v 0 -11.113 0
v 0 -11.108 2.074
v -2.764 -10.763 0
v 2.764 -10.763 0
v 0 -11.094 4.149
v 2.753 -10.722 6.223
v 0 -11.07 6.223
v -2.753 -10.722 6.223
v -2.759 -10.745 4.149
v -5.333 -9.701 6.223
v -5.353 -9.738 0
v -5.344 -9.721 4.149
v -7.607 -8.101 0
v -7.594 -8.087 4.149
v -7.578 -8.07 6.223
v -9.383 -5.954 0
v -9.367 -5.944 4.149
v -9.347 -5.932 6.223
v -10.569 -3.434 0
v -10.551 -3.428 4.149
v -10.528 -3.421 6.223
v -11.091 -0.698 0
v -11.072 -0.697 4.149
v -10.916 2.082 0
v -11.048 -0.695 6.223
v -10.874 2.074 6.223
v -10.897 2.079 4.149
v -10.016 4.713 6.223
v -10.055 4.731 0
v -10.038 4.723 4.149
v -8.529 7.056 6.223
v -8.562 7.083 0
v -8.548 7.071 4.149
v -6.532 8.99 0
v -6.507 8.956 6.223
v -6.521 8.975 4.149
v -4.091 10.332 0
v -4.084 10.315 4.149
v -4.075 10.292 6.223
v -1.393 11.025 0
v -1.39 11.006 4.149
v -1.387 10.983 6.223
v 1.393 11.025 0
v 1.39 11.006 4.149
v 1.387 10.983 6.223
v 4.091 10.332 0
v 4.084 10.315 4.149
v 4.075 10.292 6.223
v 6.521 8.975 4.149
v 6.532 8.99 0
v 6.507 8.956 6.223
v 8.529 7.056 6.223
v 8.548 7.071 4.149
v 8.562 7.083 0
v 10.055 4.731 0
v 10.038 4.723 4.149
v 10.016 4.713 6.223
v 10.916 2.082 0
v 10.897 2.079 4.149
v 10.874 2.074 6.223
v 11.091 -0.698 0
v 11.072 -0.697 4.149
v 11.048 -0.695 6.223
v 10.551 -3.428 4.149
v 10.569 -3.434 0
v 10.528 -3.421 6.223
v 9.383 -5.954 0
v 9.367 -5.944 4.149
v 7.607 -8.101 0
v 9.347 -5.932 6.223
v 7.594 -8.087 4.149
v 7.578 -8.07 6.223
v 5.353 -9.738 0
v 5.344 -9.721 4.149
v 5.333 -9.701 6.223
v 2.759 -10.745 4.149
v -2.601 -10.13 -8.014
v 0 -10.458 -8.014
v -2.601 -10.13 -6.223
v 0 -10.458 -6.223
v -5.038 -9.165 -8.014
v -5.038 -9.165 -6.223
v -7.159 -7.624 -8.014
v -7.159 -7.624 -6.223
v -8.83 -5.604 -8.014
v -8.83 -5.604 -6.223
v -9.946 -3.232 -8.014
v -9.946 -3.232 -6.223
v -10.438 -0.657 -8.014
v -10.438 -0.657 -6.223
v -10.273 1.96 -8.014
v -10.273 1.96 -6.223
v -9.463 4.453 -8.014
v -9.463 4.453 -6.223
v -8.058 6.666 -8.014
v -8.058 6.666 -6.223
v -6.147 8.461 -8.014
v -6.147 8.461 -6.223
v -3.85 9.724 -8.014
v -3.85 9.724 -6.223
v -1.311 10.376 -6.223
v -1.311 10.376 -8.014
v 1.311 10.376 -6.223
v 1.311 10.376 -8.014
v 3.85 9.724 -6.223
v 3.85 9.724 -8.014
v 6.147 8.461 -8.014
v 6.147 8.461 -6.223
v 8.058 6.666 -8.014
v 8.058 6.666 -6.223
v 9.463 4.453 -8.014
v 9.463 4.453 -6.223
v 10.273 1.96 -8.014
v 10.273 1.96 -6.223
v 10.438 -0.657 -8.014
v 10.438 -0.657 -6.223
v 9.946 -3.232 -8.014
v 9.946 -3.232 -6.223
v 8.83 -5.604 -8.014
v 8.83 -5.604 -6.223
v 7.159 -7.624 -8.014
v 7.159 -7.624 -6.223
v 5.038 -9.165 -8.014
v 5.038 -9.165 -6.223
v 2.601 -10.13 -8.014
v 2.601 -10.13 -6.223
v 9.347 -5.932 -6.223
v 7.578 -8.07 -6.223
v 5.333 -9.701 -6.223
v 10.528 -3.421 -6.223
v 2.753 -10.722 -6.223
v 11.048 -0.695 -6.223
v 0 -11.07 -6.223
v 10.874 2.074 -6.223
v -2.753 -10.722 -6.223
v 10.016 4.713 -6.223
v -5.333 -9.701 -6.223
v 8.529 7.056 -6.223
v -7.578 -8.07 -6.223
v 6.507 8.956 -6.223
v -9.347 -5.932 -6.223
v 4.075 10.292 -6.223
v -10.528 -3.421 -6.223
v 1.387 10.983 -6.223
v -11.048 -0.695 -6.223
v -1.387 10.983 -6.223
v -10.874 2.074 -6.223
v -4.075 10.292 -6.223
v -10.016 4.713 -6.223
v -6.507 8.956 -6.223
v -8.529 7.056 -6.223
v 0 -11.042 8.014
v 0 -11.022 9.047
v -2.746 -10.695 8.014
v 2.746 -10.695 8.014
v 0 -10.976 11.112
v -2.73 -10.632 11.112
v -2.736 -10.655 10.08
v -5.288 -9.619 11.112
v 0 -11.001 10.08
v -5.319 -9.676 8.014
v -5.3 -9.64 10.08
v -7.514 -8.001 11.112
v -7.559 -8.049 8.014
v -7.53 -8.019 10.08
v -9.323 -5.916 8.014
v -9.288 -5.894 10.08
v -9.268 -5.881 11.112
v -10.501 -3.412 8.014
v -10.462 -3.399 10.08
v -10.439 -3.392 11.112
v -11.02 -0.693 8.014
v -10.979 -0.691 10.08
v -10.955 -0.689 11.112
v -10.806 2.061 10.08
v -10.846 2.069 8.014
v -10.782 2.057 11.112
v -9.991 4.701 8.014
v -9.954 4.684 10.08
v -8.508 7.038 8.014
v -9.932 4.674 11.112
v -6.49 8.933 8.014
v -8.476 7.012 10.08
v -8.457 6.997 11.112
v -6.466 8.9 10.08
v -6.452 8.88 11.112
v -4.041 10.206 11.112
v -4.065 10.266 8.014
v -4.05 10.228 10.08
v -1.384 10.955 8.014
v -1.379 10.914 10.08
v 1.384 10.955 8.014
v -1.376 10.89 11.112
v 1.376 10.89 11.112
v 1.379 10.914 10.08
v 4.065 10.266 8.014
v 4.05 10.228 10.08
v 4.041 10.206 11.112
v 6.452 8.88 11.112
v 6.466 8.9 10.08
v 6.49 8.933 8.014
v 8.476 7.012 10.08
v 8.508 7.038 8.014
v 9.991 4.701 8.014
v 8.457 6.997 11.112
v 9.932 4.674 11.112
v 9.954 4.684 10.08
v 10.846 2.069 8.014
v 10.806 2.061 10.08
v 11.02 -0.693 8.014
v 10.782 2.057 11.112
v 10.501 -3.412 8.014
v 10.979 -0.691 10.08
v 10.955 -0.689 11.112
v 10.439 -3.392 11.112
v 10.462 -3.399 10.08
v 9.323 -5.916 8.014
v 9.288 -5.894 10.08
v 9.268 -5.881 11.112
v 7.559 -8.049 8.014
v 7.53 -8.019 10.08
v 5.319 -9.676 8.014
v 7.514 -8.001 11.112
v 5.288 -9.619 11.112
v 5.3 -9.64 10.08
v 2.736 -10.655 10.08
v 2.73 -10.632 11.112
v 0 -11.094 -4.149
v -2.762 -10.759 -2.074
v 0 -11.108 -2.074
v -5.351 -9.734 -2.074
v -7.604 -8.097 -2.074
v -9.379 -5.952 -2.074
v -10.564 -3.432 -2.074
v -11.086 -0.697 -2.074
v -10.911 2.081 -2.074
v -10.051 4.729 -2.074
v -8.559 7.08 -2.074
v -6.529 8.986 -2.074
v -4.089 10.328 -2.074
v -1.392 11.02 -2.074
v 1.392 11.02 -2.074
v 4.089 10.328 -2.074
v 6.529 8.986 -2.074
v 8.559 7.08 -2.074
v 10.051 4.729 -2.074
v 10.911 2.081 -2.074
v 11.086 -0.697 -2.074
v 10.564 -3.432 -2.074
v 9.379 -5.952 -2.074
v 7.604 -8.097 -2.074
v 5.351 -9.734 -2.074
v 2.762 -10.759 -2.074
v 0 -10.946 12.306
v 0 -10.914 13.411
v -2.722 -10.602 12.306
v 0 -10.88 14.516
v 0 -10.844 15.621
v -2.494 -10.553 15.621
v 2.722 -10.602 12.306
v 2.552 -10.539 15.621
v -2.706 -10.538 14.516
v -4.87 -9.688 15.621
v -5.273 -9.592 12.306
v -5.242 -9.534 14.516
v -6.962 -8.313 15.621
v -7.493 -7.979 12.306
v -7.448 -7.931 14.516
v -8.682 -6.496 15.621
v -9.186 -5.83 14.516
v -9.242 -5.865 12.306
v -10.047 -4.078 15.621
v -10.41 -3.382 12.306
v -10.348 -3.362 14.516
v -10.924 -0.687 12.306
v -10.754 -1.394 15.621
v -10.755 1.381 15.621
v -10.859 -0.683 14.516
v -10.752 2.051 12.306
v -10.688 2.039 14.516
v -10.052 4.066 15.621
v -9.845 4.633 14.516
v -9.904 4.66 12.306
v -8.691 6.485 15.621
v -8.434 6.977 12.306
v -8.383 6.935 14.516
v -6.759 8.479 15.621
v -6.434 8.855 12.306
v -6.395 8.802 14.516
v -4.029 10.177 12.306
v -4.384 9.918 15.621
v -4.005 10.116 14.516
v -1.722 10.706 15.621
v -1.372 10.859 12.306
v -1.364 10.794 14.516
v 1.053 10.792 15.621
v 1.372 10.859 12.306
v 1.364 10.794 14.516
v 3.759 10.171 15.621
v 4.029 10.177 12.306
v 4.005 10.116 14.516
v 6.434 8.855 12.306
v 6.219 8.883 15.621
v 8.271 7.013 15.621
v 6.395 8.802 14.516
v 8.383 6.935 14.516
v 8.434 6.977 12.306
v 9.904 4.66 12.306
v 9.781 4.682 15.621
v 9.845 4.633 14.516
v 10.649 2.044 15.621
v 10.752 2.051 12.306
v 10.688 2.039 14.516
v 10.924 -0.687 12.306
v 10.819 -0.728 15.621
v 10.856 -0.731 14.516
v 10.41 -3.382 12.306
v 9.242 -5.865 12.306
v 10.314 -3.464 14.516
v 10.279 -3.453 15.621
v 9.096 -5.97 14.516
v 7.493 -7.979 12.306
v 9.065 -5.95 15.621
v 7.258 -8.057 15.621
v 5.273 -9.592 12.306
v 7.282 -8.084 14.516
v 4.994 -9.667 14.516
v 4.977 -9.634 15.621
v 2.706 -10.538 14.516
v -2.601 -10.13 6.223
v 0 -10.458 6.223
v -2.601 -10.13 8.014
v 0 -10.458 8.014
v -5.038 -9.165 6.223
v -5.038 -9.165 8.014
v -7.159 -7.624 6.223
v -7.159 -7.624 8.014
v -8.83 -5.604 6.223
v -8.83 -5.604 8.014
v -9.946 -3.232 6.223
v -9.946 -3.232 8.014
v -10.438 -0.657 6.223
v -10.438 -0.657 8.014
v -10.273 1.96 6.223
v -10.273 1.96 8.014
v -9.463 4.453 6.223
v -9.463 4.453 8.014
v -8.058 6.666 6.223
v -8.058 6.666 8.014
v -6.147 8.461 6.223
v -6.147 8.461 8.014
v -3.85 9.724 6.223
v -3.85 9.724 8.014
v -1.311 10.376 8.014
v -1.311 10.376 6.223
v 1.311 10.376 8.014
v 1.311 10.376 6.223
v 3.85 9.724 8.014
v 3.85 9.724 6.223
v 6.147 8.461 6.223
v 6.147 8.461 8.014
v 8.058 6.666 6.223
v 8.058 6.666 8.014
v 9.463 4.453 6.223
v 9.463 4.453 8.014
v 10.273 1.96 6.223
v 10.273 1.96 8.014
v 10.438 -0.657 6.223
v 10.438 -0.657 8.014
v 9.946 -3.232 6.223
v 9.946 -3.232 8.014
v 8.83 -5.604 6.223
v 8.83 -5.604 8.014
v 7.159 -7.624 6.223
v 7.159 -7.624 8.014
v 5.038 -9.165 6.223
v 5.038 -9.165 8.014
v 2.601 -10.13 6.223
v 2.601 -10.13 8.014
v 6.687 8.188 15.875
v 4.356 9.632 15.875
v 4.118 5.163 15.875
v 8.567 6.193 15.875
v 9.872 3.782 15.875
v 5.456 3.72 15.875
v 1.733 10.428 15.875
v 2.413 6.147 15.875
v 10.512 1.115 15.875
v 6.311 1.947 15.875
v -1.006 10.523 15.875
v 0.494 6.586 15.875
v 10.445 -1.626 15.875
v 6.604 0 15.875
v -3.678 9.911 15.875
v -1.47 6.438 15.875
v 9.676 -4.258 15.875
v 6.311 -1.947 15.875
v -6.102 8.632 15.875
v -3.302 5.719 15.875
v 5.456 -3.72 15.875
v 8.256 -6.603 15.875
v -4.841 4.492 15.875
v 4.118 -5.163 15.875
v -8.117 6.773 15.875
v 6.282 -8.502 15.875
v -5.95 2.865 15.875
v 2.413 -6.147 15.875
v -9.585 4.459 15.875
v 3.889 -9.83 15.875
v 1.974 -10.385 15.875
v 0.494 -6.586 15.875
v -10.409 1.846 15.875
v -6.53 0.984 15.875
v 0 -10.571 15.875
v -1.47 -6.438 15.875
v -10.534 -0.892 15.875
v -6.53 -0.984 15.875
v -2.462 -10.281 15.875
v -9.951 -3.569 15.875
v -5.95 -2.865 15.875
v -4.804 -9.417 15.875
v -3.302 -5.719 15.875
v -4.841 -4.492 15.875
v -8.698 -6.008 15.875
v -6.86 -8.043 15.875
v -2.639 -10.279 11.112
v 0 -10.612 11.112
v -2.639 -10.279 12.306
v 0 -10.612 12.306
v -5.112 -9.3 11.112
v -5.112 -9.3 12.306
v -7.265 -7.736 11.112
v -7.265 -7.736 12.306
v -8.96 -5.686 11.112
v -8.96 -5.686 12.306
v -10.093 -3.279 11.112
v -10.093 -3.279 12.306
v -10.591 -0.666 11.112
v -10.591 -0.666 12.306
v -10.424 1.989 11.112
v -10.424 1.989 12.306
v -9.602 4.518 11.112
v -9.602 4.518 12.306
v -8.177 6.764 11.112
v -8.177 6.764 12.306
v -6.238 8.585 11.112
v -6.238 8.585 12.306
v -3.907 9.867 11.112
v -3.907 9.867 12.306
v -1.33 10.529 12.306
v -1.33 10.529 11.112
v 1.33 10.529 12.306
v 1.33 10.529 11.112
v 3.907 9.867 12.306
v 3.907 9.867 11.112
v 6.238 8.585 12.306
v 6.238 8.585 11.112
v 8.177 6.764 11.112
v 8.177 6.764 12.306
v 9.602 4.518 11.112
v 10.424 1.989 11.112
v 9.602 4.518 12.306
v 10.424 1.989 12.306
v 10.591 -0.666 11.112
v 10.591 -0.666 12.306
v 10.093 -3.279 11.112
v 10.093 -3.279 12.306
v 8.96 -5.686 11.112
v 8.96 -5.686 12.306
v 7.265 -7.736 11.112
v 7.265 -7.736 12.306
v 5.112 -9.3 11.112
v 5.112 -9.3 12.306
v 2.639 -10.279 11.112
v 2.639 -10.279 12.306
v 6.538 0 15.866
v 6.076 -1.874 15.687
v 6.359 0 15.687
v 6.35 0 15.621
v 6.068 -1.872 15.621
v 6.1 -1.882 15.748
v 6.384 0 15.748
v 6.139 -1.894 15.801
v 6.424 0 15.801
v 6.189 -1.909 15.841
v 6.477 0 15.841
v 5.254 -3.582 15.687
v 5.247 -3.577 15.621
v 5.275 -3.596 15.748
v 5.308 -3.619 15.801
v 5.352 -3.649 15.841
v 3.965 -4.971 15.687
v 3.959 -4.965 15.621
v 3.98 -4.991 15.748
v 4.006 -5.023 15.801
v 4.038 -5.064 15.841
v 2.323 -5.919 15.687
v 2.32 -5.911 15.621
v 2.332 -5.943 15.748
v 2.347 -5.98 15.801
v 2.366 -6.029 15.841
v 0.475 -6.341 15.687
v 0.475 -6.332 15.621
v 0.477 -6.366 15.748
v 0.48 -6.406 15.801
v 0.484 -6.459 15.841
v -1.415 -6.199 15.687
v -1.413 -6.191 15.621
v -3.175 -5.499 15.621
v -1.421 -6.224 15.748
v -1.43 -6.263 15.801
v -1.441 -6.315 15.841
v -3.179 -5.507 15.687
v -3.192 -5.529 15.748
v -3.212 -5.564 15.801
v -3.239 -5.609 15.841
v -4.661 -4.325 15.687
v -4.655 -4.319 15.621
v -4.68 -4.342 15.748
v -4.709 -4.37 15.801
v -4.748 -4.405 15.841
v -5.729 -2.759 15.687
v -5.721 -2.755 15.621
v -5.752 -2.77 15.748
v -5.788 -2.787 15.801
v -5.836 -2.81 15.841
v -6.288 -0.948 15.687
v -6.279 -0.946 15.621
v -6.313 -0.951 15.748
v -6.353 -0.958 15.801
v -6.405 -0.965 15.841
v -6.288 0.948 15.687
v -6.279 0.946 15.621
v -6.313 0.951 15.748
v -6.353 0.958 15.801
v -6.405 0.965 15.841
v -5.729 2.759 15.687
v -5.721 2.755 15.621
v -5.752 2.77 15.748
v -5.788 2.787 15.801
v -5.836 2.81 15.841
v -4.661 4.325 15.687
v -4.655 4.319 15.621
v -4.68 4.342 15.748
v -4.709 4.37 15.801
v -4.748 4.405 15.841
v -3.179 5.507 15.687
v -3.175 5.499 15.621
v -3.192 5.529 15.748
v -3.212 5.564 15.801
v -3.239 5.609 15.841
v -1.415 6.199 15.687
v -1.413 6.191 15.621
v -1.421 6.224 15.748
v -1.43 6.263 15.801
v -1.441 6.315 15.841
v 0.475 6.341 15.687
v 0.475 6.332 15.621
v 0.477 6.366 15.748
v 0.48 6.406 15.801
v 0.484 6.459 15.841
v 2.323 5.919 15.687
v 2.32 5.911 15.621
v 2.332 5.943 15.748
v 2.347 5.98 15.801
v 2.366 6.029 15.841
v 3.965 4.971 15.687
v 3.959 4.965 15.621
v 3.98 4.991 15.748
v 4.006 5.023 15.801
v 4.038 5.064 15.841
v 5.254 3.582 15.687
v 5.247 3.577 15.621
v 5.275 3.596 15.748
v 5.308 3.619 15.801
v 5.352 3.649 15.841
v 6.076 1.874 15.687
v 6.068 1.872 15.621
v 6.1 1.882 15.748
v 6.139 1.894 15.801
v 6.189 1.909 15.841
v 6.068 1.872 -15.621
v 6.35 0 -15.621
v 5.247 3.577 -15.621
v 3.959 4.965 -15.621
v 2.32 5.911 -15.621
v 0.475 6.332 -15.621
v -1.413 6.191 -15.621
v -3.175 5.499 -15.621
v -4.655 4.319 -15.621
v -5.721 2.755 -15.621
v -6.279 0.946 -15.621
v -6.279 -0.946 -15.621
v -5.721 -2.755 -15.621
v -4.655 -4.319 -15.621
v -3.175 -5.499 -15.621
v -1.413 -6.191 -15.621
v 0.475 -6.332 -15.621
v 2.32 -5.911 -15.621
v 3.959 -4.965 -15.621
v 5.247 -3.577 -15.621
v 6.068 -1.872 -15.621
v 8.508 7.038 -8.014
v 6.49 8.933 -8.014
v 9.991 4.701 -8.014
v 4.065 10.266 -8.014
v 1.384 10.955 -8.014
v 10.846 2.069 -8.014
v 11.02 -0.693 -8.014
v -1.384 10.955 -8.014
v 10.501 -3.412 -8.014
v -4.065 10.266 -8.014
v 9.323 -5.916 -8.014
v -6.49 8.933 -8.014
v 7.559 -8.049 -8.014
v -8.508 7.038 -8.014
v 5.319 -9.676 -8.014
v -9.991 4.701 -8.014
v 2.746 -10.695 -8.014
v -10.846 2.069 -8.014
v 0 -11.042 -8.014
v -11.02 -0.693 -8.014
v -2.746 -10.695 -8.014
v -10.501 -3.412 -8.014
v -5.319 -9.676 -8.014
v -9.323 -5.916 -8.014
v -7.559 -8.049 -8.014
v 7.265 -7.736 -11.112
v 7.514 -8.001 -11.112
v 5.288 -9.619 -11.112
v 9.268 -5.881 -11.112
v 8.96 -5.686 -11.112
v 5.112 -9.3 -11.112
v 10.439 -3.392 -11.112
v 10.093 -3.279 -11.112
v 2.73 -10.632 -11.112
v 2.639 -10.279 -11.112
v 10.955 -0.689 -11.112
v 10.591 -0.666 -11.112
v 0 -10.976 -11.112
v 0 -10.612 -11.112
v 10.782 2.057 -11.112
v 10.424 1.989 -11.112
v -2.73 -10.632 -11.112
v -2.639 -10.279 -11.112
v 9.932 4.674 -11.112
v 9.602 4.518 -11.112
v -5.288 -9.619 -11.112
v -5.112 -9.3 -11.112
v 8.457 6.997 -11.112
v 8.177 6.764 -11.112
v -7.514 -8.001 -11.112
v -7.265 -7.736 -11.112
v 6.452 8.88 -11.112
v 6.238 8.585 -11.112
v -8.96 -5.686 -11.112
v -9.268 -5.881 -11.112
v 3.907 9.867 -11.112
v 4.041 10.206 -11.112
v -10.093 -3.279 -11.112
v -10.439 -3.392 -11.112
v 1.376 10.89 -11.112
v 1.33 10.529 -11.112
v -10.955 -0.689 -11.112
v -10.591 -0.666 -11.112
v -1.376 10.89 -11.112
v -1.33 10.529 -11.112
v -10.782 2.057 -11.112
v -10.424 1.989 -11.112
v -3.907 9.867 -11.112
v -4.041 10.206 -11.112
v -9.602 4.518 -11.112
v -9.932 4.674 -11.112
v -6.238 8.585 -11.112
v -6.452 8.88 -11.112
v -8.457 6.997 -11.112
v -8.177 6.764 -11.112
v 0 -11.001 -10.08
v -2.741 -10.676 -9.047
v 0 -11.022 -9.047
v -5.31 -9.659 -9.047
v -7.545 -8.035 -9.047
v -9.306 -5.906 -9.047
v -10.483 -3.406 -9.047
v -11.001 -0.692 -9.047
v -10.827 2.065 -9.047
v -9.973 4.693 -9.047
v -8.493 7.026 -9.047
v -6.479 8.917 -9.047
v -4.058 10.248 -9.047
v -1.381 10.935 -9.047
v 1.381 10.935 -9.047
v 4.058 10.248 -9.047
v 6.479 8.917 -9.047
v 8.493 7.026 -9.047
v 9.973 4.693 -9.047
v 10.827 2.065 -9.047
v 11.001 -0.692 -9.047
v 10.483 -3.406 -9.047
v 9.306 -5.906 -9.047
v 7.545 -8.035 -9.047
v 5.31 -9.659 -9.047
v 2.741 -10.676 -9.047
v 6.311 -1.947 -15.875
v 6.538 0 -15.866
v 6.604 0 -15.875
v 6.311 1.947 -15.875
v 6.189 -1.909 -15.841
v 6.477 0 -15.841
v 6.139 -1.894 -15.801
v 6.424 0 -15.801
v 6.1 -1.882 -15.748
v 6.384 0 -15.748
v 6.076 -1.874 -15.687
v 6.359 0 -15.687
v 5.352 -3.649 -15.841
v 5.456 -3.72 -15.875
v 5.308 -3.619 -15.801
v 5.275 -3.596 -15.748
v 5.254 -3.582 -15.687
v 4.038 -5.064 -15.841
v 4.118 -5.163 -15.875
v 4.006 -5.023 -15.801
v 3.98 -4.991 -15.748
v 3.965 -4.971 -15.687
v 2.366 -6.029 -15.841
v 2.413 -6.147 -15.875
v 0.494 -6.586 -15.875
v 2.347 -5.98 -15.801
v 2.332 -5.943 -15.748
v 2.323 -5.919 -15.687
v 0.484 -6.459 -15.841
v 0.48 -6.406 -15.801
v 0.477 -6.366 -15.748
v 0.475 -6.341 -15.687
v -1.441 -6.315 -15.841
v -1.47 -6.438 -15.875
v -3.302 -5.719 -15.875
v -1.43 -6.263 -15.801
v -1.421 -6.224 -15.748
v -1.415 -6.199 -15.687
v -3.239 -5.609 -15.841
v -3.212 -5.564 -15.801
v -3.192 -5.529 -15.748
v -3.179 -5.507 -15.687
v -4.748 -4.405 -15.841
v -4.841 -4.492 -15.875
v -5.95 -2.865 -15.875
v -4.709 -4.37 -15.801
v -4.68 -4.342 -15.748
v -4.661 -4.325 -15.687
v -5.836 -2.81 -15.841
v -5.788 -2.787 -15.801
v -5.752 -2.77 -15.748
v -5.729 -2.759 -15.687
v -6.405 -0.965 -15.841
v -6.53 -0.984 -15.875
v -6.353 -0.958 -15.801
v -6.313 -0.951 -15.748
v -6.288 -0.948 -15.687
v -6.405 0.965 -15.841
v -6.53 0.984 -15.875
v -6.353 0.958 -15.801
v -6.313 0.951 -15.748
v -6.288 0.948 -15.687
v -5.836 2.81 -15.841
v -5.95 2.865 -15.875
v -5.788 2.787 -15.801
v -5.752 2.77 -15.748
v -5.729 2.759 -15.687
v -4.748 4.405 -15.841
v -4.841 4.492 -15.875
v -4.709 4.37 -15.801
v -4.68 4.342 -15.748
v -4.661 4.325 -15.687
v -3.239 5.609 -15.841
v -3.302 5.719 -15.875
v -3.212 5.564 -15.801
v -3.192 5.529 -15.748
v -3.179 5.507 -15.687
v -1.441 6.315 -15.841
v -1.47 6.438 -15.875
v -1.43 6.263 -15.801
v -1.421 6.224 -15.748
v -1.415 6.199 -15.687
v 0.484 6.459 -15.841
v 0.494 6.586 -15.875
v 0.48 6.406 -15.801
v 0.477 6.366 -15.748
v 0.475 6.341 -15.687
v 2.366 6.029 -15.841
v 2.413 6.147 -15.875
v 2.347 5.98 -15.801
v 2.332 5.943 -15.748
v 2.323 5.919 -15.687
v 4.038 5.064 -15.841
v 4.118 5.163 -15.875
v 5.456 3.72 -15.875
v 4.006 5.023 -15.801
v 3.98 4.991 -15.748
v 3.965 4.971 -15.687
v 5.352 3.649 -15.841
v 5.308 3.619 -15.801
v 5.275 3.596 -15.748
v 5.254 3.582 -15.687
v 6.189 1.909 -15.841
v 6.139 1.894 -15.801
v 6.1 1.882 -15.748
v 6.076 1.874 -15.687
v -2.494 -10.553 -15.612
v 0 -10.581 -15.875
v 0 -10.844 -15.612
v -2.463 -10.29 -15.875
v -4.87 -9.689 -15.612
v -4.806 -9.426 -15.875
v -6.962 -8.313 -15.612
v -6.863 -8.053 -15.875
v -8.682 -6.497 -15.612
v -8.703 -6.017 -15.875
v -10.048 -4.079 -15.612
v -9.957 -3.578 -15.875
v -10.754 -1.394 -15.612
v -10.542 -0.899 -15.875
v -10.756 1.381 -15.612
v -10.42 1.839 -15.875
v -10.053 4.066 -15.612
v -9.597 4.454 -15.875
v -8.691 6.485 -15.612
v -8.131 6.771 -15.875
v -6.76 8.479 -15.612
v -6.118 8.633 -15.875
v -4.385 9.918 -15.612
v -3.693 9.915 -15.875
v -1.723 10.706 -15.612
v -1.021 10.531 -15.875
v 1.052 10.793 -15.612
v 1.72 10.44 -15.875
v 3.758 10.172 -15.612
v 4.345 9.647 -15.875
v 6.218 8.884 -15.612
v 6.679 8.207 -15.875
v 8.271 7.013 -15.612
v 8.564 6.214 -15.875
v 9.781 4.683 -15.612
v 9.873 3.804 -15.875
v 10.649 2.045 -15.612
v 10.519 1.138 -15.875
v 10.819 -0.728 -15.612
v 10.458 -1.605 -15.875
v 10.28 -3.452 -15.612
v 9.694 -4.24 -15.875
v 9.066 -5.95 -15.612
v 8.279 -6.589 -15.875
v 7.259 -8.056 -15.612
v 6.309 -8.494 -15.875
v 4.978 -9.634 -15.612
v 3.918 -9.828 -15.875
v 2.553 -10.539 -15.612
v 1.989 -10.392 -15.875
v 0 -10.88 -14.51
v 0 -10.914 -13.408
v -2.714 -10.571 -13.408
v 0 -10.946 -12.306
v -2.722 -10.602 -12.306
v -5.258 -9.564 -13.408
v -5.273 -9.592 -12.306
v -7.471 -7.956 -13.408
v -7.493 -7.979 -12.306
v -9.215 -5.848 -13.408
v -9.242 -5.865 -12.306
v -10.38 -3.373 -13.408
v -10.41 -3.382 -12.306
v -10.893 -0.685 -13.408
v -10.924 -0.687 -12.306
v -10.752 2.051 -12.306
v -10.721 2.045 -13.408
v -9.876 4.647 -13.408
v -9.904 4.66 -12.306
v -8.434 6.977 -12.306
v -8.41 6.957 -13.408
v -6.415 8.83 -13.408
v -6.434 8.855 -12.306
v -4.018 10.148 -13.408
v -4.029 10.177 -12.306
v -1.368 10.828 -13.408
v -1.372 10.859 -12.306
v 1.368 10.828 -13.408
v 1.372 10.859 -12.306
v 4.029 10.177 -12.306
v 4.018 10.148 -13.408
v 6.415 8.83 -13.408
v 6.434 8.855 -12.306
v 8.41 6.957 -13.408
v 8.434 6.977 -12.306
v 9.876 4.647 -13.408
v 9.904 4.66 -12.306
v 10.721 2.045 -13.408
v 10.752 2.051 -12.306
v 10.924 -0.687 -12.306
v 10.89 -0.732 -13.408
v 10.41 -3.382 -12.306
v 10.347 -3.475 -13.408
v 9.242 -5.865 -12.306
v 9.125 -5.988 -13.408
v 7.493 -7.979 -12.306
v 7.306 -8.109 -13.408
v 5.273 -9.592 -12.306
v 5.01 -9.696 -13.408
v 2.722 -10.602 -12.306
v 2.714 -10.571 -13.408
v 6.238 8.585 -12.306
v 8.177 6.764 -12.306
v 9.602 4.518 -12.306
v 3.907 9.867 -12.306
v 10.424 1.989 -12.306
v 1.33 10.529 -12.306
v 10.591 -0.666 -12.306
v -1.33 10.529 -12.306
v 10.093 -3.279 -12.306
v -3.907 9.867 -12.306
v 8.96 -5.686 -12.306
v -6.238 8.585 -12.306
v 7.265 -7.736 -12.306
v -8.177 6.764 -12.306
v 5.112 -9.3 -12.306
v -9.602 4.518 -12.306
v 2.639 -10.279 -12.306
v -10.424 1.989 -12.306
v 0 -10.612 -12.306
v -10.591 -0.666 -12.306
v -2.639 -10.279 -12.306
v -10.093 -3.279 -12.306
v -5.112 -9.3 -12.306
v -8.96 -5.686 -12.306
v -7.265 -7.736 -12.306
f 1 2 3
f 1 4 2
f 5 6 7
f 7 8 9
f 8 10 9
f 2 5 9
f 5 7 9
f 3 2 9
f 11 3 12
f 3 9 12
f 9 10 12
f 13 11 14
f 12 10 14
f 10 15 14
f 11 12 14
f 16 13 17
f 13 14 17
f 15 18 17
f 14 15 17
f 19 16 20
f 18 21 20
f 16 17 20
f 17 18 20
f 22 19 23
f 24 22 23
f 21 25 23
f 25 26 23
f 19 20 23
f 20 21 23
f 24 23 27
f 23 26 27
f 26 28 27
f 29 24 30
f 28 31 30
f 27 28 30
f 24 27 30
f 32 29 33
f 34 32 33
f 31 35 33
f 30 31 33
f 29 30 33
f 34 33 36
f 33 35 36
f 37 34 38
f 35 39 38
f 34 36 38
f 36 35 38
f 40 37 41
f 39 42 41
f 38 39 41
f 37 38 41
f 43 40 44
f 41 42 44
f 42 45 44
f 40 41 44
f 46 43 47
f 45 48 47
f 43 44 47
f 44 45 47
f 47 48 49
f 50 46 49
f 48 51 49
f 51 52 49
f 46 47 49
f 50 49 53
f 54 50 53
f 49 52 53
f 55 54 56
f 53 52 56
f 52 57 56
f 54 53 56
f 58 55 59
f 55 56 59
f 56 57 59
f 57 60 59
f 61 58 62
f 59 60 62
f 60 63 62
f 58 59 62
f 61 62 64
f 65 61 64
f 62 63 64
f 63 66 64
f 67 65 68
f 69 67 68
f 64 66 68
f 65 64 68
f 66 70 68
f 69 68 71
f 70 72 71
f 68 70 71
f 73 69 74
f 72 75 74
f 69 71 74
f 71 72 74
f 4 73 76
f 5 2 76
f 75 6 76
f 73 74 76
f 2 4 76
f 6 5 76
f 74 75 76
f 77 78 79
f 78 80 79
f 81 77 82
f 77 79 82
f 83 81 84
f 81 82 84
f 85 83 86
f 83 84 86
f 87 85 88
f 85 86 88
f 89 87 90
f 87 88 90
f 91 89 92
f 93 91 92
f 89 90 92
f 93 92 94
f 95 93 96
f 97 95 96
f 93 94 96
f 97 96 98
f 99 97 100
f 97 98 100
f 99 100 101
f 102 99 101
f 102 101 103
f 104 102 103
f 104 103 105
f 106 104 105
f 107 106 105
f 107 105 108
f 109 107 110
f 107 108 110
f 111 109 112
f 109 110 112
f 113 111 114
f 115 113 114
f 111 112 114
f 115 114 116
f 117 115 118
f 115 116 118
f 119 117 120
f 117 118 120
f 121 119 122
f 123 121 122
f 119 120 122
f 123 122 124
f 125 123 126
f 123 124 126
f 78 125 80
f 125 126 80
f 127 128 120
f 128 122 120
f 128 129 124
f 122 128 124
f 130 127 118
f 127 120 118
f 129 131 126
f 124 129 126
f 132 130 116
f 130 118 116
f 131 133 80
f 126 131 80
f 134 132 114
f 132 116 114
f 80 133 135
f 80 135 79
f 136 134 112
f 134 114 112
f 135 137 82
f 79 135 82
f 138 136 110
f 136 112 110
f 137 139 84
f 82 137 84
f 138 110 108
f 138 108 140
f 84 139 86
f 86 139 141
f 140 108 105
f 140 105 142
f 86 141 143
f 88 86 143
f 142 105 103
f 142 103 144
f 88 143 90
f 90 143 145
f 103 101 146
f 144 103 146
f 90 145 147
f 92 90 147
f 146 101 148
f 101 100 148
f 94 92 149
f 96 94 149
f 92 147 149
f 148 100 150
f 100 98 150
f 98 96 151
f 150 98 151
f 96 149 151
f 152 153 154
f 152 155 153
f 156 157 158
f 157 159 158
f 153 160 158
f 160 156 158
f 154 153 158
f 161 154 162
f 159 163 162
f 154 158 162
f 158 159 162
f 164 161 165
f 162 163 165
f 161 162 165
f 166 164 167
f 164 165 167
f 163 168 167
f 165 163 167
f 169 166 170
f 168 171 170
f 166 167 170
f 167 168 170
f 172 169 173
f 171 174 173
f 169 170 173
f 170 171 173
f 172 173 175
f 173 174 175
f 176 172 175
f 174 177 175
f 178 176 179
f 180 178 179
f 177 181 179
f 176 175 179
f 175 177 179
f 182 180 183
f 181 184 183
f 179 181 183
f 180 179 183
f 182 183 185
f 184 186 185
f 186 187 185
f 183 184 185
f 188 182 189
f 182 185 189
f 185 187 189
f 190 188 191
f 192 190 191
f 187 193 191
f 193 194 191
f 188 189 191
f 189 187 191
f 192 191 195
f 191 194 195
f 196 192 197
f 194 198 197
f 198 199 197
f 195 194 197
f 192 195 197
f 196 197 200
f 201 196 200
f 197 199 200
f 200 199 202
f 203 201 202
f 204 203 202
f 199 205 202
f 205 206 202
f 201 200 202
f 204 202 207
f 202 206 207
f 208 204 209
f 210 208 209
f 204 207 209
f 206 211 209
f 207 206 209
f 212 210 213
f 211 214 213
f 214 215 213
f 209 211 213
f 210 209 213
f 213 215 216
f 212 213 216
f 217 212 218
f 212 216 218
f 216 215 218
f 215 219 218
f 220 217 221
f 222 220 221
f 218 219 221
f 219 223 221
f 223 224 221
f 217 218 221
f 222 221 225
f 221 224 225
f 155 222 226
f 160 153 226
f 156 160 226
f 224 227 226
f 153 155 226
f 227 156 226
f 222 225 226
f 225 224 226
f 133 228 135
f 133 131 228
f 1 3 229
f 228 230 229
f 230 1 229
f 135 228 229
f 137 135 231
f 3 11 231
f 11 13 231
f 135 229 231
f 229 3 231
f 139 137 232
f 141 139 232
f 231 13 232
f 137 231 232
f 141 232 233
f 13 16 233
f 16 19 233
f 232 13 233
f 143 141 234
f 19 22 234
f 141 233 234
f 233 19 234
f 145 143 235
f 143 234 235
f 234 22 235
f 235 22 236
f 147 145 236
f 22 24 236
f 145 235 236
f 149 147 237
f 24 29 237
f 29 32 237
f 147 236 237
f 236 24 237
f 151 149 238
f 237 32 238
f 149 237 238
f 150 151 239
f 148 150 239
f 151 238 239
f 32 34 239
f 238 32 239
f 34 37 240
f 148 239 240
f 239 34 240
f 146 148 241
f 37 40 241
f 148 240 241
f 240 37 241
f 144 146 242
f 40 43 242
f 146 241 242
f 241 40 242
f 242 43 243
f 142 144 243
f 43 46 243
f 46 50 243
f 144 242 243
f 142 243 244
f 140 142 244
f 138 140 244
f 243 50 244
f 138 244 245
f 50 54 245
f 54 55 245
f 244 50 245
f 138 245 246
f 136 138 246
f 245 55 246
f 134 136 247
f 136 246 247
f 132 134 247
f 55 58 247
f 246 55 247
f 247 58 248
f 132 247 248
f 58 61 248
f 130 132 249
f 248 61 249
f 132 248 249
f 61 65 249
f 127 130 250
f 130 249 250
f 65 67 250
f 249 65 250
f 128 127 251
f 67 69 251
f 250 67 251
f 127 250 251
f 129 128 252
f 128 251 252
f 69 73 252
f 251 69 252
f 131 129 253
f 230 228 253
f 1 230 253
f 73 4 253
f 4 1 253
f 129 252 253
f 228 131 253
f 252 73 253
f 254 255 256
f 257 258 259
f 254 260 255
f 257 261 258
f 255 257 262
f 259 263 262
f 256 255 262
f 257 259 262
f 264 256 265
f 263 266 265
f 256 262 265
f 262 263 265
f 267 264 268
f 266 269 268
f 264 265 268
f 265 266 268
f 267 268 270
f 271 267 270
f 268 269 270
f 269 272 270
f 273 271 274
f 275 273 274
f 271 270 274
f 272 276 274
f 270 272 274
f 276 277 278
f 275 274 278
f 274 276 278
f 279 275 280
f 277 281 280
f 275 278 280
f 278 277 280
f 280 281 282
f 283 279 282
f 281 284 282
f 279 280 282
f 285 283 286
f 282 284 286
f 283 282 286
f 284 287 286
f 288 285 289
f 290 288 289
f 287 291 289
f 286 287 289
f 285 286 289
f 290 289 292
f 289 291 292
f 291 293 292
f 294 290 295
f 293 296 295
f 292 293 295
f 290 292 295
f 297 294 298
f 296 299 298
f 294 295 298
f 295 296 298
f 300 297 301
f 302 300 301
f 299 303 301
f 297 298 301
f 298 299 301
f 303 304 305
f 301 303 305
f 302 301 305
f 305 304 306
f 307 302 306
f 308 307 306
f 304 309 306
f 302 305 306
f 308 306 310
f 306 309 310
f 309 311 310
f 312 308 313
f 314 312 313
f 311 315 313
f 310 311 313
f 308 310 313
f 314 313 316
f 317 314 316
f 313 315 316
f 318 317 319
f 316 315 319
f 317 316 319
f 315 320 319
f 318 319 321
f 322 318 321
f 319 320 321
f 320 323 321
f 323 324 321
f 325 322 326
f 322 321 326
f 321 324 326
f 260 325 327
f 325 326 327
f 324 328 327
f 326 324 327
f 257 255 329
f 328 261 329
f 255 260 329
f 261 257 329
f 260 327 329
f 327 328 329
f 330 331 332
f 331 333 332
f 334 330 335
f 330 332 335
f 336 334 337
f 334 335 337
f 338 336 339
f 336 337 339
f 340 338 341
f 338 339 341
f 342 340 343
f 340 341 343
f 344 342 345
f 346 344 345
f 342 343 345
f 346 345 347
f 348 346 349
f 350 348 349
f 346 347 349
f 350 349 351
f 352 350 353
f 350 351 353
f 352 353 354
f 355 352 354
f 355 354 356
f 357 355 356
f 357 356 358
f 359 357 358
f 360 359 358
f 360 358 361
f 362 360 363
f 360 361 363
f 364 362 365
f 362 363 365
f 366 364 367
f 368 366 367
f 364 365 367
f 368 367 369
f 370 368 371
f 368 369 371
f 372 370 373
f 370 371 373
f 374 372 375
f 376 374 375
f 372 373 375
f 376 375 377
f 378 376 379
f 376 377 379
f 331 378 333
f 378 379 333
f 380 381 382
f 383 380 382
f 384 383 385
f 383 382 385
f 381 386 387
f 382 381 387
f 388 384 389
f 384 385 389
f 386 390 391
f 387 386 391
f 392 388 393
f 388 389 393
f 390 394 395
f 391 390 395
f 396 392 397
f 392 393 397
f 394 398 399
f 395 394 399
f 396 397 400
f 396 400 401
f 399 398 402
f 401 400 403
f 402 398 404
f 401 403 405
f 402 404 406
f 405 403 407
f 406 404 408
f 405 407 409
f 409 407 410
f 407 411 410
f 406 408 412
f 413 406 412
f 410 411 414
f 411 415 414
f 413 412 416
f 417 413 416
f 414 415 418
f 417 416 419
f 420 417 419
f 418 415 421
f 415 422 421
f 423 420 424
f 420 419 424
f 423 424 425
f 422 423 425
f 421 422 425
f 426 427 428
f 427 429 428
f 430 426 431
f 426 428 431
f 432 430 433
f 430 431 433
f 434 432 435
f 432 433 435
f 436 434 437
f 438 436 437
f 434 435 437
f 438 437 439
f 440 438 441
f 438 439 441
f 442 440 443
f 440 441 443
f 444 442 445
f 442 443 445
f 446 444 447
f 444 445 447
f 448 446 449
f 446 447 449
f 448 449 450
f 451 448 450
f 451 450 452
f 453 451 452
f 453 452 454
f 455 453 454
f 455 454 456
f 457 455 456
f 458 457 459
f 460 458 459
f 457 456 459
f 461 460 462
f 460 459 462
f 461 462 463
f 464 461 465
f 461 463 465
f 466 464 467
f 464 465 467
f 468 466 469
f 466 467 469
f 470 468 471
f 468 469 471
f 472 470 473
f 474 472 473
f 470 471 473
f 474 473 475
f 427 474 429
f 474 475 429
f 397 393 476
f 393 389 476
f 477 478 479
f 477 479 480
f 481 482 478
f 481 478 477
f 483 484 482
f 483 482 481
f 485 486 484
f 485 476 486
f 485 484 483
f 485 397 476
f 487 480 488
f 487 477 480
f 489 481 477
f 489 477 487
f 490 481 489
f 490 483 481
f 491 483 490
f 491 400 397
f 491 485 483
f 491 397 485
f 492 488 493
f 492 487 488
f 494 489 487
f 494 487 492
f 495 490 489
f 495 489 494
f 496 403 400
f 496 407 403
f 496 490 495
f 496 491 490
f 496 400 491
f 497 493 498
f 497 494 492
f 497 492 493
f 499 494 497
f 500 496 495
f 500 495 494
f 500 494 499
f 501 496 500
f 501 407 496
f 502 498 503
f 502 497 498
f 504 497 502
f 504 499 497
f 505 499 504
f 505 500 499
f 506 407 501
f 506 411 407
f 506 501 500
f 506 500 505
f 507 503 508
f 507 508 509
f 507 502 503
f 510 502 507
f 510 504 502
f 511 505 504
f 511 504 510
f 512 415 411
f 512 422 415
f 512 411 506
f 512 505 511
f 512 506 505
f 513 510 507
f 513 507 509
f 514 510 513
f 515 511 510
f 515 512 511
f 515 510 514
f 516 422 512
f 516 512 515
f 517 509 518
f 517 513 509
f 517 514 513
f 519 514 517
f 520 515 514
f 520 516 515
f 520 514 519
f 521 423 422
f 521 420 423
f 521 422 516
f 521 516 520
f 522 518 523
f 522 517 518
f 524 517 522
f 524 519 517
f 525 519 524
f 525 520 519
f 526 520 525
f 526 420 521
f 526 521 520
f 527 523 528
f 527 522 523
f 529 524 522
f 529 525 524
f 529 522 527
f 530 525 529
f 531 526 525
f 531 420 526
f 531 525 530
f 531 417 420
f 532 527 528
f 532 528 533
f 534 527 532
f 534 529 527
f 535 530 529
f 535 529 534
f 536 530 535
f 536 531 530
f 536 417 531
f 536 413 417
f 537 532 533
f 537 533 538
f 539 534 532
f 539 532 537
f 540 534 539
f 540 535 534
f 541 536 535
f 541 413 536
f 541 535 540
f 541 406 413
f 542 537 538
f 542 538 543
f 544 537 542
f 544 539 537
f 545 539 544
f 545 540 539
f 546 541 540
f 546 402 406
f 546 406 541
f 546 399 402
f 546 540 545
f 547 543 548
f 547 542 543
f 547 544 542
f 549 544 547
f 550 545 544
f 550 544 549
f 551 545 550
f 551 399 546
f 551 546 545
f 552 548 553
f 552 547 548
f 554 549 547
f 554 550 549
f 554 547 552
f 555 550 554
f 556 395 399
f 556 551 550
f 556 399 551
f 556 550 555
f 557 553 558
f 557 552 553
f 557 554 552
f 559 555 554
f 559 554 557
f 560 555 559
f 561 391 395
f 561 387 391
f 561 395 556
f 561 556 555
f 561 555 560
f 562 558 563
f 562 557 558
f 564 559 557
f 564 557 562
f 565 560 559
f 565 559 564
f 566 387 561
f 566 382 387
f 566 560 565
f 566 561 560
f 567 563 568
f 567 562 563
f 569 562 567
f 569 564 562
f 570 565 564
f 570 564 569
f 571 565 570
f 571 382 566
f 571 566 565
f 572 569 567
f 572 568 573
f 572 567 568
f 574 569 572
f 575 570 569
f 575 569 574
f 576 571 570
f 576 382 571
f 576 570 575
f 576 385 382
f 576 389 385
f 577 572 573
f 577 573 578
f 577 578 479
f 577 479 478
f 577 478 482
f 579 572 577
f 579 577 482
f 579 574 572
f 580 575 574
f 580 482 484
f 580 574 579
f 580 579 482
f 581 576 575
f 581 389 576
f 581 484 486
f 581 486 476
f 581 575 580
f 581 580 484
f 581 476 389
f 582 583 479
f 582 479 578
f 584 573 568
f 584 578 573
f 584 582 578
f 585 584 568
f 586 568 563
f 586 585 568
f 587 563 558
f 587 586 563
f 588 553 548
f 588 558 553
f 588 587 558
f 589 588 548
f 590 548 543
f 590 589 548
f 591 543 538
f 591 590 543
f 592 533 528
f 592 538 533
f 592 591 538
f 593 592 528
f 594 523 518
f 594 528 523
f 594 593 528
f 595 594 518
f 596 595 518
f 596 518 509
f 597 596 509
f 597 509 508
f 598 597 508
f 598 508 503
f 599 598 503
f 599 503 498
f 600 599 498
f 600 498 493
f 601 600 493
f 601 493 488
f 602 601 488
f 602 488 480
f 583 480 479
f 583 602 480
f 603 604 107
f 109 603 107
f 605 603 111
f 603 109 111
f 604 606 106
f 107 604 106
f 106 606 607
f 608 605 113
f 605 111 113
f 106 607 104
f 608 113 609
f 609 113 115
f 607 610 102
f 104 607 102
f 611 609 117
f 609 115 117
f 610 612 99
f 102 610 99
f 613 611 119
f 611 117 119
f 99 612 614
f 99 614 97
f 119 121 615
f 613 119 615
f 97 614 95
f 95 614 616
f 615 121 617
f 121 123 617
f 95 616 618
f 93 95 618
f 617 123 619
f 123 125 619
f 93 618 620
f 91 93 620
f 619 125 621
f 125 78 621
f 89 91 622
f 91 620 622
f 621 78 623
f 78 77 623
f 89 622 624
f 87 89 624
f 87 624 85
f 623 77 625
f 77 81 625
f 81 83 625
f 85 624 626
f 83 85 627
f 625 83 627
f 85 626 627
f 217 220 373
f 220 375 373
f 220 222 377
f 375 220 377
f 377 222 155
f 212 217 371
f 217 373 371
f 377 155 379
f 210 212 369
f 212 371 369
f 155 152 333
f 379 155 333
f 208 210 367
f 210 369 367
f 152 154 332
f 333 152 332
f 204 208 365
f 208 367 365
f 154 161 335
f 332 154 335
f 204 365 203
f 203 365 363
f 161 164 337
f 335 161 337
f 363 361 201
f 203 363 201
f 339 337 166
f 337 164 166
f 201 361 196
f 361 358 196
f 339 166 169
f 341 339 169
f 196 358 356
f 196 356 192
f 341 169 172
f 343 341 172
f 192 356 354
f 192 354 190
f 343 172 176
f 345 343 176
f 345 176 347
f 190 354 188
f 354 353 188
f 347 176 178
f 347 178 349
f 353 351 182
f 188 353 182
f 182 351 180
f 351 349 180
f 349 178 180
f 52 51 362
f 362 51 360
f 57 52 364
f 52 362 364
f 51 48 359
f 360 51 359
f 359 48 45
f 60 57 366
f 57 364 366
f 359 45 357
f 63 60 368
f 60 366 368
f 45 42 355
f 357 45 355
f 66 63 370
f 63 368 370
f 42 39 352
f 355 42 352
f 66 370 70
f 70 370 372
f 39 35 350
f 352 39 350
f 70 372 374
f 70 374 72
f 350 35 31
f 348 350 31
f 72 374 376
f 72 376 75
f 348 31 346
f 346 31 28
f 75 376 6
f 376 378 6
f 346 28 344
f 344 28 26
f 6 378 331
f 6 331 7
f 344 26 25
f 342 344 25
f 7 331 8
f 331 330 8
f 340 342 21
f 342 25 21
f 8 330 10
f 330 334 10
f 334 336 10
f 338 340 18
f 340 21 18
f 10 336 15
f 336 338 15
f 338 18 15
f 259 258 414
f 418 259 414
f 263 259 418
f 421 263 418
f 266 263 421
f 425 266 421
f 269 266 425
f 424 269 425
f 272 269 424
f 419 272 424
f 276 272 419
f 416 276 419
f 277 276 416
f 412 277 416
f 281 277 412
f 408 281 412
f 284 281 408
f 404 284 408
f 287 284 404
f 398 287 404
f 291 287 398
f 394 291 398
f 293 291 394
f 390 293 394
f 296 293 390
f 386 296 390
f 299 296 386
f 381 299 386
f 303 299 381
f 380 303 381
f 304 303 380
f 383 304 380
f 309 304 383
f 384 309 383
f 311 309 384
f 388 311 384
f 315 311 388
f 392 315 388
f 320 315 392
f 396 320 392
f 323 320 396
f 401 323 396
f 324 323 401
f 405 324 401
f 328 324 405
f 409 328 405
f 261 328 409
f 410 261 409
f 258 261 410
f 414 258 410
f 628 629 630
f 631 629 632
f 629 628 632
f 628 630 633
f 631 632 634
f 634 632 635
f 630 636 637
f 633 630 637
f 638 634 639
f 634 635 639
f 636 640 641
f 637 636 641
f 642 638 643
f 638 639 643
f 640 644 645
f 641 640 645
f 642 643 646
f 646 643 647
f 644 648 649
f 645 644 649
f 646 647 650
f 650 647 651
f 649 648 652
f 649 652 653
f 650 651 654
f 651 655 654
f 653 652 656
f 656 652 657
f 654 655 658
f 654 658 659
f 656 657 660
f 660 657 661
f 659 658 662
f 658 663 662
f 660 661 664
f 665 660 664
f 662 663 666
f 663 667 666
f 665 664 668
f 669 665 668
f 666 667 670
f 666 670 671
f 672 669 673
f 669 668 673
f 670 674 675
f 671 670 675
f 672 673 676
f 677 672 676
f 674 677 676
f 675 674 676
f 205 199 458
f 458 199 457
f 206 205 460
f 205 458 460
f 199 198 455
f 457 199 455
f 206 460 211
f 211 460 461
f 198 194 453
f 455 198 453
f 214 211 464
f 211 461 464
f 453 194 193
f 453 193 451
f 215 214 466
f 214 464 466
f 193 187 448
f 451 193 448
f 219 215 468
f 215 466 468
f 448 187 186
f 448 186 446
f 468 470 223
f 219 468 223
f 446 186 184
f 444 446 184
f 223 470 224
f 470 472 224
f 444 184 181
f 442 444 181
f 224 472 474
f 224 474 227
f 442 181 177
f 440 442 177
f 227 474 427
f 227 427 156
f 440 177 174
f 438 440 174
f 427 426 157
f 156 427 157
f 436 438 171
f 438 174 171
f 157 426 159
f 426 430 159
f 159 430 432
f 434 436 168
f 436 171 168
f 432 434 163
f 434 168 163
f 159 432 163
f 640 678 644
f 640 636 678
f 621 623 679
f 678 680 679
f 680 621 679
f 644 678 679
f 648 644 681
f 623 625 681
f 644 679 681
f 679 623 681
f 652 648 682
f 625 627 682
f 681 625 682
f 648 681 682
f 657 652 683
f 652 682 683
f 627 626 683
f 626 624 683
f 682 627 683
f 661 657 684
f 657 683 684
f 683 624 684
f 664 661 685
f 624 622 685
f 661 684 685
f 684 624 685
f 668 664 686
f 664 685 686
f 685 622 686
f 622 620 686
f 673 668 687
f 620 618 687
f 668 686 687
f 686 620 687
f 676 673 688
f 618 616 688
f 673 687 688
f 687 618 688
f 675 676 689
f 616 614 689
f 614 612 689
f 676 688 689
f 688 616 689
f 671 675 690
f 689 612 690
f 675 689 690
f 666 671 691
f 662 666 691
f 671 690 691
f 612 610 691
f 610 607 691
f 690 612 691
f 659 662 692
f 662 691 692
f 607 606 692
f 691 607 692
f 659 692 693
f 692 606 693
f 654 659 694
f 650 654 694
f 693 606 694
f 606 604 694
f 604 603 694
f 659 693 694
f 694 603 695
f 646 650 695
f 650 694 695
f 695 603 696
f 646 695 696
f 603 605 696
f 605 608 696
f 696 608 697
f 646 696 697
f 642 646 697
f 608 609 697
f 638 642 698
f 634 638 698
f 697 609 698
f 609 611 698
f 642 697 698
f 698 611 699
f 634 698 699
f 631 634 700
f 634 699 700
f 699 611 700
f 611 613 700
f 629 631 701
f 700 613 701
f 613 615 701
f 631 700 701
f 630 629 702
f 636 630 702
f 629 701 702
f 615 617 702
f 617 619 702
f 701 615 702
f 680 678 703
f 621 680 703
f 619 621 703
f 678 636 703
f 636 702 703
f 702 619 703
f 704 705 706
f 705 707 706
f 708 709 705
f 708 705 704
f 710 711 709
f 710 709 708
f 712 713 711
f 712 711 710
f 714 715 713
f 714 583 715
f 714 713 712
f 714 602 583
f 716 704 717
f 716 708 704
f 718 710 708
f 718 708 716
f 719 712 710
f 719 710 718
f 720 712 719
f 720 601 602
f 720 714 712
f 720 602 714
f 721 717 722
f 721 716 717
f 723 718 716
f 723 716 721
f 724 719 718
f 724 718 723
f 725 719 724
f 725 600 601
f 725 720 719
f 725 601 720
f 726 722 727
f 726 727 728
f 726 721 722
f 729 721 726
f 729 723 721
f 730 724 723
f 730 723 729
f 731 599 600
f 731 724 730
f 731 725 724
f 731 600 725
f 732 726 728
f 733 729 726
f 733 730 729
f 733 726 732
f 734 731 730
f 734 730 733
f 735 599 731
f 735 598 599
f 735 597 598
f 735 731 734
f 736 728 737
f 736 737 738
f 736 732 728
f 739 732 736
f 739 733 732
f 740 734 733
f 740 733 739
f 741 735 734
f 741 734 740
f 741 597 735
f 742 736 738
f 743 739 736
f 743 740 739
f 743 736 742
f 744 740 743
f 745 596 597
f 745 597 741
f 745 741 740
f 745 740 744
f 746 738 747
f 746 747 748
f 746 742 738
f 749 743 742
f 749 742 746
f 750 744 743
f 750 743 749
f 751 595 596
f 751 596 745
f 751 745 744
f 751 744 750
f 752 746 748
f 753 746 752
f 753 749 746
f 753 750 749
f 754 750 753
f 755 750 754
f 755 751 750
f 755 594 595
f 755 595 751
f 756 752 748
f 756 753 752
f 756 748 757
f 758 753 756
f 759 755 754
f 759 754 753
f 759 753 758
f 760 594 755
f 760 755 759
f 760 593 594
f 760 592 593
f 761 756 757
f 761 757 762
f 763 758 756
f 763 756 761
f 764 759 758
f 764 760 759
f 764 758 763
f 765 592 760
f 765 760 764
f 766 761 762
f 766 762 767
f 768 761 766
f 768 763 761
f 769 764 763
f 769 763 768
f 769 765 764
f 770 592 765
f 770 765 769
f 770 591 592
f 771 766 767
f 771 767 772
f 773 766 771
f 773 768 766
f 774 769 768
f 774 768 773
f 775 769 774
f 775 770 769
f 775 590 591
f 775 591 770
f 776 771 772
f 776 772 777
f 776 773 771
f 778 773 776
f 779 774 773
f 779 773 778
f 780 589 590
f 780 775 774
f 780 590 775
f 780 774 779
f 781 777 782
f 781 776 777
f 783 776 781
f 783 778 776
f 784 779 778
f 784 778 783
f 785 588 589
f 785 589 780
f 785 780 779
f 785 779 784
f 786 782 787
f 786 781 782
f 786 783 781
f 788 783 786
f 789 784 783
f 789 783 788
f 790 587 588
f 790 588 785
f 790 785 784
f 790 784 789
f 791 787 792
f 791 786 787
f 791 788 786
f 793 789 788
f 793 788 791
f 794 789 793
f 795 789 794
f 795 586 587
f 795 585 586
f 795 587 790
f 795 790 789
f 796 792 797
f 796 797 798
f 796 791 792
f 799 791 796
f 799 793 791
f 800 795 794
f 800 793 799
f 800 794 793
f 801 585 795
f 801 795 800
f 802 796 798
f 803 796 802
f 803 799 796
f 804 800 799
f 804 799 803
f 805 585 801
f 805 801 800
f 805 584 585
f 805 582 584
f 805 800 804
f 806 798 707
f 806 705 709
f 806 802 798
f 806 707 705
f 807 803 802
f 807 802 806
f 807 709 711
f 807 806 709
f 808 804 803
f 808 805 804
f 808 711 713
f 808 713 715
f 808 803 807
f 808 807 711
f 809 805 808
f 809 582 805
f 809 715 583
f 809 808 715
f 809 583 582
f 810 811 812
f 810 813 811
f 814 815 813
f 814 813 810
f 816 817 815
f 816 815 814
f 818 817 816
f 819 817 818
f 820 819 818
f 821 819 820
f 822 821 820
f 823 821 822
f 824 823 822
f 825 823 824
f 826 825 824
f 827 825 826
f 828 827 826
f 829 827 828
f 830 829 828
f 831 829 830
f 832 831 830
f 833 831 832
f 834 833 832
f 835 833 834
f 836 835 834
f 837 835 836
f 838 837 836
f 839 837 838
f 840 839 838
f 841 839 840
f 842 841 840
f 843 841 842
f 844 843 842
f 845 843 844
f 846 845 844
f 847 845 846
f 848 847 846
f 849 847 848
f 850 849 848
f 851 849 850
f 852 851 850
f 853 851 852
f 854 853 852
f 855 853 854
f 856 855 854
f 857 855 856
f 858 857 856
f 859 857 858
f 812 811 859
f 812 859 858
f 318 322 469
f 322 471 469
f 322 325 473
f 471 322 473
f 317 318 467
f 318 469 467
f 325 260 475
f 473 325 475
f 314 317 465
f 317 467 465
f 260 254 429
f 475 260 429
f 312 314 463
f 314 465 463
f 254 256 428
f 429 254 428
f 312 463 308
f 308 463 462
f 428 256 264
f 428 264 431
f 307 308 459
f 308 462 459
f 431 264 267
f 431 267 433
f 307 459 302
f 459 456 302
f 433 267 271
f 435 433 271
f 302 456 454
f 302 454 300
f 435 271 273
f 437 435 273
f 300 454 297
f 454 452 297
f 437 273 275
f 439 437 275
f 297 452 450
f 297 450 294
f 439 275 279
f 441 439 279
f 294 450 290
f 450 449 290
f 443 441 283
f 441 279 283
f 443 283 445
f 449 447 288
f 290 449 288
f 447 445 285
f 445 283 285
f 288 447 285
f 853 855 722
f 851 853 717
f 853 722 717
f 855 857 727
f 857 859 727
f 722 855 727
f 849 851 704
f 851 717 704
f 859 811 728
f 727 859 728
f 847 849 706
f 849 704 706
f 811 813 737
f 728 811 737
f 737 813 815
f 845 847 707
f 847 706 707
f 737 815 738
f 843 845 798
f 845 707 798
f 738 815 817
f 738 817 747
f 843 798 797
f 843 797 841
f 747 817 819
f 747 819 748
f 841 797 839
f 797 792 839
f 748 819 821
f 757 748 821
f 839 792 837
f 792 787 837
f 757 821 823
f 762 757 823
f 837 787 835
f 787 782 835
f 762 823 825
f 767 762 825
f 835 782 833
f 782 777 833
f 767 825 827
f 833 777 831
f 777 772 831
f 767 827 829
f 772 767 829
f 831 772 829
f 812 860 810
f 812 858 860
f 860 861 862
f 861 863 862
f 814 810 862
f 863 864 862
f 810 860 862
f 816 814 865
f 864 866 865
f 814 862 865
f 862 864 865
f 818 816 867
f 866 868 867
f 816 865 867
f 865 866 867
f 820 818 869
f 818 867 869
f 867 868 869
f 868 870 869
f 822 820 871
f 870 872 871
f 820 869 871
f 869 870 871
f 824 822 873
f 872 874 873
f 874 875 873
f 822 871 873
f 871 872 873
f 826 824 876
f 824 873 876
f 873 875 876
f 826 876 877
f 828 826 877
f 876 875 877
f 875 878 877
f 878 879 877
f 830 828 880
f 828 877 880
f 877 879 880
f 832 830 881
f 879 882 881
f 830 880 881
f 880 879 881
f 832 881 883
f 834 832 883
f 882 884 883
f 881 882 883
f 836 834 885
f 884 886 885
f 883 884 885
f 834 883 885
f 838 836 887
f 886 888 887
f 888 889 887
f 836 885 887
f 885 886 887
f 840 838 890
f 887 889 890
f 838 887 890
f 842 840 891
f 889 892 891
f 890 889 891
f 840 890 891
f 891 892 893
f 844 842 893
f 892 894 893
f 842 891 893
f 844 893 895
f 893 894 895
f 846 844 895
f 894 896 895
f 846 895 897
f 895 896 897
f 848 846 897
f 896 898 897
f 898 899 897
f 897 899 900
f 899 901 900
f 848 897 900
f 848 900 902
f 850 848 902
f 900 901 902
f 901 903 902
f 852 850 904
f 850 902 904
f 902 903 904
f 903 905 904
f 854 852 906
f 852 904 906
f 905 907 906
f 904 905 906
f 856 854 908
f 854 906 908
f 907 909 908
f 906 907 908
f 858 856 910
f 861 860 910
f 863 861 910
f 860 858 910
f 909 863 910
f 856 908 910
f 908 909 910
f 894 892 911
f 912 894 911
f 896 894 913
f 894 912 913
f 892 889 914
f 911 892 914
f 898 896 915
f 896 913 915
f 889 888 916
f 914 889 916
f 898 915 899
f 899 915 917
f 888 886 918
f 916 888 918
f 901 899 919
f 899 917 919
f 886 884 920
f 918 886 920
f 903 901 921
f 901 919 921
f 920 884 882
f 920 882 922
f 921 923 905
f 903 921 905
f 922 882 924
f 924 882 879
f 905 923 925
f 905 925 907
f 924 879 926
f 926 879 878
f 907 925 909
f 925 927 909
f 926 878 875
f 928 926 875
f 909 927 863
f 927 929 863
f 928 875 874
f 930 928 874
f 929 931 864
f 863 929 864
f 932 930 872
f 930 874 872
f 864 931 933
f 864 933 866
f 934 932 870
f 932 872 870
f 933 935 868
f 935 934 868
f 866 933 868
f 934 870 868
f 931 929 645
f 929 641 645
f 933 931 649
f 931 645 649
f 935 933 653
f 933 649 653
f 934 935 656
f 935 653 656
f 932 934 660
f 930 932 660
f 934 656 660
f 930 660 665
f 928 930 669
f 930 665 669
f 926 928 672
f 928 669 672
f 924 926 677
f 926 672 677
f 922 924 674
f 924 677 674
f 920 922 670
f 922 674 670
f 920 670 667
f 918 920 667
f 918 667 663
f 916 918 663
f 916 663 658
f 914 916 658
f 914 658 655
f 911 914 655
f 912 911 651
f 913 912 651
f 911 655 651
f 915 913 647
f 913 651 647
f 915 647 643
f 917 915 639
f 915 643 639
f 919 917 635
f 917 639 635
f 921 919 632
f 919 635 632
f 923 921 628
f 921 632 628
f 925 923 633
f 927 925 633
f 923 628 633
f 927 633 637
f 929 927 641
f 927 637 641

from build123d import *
from OCP.BRepFilletAPI import BRepFilletAPI_MakeChamfer

# Parameters (mm, degrees)
BORE_DEPTH       = 23.338105227
BORE_DEPTH_BACK  = 23.338105227
SKETCH2_R        = 6.35
OD_CHAMFER_SIZE  = 0.254
OD_CHAMFER_SIZE2 = 0.263376629
ID_FILLET_R      = 0.254


with BuildPart() as part:
    # Sketch1 → Bearing (revolve)
    with BuildSketch(Plane(origin=(0, 0, 0), x_dir=(0, 0, -1), z_dir=(1, 0, 0))):
        with BuildLine():
            Line((-15.875, 0), (15.875, 0))
            Line((15.875, 0), (15.875, -10.8346875))
            ThreePointArc((15.875, -10.8346875), (14.090759076, -10.893640768), (12.3063, -10.945573139))
            Line((12.3063, -10.945573139), (12.3063, -10.612198139))
            Line((12.3063, -10.612198139), (11.1125, -10.612198139))
            Line((11.1125, -10.612198139), (11.1125, -10.976393136))
            ThreePointArc((11.1125, -10.976393136), (9.563155787, -11.011704293), (8.0137, -11.041723127))
            Line((8.0137, -11.041723127), (8.0137, -10.458316877))
            Line((8.0137, -10.458316877), (6.223, -10.458316877))
            Line((6.223, -10.458316877), (6.223, -11.069821282))
            ThreePointArc((6.223, -11.069821282), (3.111573174, -11.101830195), (0, -11.1125))
            ThreePointArc((0, -11.1125), (-3.111573174, -11.101830195), (-6.223, -11.069821282))
            Line((-6.223, -11.069821282), (-6.223, -10.458316877))
            Line((-6.223, -10.458316877), (-8.0137, -10.458316877))
            Line((-8.0137, -10.458316877), (-8.0137, -11.041723127))
            ThreePointArc((-8.0137, -11.041723127), (-9.563155787, -11.011704293), (-11.1125, -10.976393136))
            Line((-11.1125, -10.976393136), (-11.1125, -10.612198139))
            Line((-11.1125, -10.612198139), (-12.3063, -10.612198139))
            Line((-12.3063, -10.612198139), (-12.3063, -10.945573139))
            ThreePointArc((-12.3063, -10.945573139), (-14.090759076, -10.893640768), (-15.875, -10.8346875))
            Line((-15.875, -10.8346875), (-15.875, 0))
        make_face()
    revolve(axis=Axis((0, 0, 15.875), (0, 0, -1)))

    # Sketch2 → Bore (cut, two sides: drawn at the far end of the back side and taken through both)
    with BuildSketch(Plane.XY.offset(-BORE_DEPTH_BACK)):
        Circle(SKETCH2_R)
    extrude(amount=BORE_DEPTH + BORE_DEPTH_BACK, mode=Mode.SUBTRACT)

    # OD Chamfer: one chamfer whose edges measure the first distance from different faces: ONE call of the kernel's chamfer builder (chamfer() names one face for all edges)
    od_chamfer_edges_1 = [part.edges().sort_by_distance(p)[0] for p in [
        (0, 10.8346875, 15.875),
    ]]
    od_chamfer_side_1 = [part.faces().sort_by_distance(p)[0] for p in [
        (0, 10.893640768, 14.090759076),
    ]]
    od_chamfer_edges_2 = [part.edges().sort_by_distance(p)[0] for p in [
        (0, 10.8346875, -15.875),
    ]]
    od_chamfer_side_2 = [part.faces().sort_by_distance(p)[0] for p in [
        (0, 10.52823626, -15.875),
    ]]
    od_chamfer = BRepFilletAPI_MakeChamfer(part.part.solid().wrapped)
    for e in od_chamfer_edges_1:
        od_chamfer.Add(OD_CHAMFER_SIZE, OD_CHAMFER_SIZE2, e.wrapped, od_chamfer_side_1[0].wrapped)  # the first distance lies on this face
    for e in od_chamfer_edges_2:
        od_chamfer.Add(OD_CHAMFER_SIZE, OD_CHAMFER_SIZE2, e.wrapped, od_chamfer_side_2[0].wrapped)  # the first distance lies on this face
    add(Compound.cast(od_chamfer.Shape()), mode=Mode.REPLACE)

    # ID Fillet
    id_fillet_edges = [part.edges().sort_by_distance(p)[0] for p in [
        (-6.35, 0, -15.875),
        (-6.35, 0, 15.875),
    ]]
    fillet(id_fillet_edges, radius=ID_FILLET_R)


solid = part.part
